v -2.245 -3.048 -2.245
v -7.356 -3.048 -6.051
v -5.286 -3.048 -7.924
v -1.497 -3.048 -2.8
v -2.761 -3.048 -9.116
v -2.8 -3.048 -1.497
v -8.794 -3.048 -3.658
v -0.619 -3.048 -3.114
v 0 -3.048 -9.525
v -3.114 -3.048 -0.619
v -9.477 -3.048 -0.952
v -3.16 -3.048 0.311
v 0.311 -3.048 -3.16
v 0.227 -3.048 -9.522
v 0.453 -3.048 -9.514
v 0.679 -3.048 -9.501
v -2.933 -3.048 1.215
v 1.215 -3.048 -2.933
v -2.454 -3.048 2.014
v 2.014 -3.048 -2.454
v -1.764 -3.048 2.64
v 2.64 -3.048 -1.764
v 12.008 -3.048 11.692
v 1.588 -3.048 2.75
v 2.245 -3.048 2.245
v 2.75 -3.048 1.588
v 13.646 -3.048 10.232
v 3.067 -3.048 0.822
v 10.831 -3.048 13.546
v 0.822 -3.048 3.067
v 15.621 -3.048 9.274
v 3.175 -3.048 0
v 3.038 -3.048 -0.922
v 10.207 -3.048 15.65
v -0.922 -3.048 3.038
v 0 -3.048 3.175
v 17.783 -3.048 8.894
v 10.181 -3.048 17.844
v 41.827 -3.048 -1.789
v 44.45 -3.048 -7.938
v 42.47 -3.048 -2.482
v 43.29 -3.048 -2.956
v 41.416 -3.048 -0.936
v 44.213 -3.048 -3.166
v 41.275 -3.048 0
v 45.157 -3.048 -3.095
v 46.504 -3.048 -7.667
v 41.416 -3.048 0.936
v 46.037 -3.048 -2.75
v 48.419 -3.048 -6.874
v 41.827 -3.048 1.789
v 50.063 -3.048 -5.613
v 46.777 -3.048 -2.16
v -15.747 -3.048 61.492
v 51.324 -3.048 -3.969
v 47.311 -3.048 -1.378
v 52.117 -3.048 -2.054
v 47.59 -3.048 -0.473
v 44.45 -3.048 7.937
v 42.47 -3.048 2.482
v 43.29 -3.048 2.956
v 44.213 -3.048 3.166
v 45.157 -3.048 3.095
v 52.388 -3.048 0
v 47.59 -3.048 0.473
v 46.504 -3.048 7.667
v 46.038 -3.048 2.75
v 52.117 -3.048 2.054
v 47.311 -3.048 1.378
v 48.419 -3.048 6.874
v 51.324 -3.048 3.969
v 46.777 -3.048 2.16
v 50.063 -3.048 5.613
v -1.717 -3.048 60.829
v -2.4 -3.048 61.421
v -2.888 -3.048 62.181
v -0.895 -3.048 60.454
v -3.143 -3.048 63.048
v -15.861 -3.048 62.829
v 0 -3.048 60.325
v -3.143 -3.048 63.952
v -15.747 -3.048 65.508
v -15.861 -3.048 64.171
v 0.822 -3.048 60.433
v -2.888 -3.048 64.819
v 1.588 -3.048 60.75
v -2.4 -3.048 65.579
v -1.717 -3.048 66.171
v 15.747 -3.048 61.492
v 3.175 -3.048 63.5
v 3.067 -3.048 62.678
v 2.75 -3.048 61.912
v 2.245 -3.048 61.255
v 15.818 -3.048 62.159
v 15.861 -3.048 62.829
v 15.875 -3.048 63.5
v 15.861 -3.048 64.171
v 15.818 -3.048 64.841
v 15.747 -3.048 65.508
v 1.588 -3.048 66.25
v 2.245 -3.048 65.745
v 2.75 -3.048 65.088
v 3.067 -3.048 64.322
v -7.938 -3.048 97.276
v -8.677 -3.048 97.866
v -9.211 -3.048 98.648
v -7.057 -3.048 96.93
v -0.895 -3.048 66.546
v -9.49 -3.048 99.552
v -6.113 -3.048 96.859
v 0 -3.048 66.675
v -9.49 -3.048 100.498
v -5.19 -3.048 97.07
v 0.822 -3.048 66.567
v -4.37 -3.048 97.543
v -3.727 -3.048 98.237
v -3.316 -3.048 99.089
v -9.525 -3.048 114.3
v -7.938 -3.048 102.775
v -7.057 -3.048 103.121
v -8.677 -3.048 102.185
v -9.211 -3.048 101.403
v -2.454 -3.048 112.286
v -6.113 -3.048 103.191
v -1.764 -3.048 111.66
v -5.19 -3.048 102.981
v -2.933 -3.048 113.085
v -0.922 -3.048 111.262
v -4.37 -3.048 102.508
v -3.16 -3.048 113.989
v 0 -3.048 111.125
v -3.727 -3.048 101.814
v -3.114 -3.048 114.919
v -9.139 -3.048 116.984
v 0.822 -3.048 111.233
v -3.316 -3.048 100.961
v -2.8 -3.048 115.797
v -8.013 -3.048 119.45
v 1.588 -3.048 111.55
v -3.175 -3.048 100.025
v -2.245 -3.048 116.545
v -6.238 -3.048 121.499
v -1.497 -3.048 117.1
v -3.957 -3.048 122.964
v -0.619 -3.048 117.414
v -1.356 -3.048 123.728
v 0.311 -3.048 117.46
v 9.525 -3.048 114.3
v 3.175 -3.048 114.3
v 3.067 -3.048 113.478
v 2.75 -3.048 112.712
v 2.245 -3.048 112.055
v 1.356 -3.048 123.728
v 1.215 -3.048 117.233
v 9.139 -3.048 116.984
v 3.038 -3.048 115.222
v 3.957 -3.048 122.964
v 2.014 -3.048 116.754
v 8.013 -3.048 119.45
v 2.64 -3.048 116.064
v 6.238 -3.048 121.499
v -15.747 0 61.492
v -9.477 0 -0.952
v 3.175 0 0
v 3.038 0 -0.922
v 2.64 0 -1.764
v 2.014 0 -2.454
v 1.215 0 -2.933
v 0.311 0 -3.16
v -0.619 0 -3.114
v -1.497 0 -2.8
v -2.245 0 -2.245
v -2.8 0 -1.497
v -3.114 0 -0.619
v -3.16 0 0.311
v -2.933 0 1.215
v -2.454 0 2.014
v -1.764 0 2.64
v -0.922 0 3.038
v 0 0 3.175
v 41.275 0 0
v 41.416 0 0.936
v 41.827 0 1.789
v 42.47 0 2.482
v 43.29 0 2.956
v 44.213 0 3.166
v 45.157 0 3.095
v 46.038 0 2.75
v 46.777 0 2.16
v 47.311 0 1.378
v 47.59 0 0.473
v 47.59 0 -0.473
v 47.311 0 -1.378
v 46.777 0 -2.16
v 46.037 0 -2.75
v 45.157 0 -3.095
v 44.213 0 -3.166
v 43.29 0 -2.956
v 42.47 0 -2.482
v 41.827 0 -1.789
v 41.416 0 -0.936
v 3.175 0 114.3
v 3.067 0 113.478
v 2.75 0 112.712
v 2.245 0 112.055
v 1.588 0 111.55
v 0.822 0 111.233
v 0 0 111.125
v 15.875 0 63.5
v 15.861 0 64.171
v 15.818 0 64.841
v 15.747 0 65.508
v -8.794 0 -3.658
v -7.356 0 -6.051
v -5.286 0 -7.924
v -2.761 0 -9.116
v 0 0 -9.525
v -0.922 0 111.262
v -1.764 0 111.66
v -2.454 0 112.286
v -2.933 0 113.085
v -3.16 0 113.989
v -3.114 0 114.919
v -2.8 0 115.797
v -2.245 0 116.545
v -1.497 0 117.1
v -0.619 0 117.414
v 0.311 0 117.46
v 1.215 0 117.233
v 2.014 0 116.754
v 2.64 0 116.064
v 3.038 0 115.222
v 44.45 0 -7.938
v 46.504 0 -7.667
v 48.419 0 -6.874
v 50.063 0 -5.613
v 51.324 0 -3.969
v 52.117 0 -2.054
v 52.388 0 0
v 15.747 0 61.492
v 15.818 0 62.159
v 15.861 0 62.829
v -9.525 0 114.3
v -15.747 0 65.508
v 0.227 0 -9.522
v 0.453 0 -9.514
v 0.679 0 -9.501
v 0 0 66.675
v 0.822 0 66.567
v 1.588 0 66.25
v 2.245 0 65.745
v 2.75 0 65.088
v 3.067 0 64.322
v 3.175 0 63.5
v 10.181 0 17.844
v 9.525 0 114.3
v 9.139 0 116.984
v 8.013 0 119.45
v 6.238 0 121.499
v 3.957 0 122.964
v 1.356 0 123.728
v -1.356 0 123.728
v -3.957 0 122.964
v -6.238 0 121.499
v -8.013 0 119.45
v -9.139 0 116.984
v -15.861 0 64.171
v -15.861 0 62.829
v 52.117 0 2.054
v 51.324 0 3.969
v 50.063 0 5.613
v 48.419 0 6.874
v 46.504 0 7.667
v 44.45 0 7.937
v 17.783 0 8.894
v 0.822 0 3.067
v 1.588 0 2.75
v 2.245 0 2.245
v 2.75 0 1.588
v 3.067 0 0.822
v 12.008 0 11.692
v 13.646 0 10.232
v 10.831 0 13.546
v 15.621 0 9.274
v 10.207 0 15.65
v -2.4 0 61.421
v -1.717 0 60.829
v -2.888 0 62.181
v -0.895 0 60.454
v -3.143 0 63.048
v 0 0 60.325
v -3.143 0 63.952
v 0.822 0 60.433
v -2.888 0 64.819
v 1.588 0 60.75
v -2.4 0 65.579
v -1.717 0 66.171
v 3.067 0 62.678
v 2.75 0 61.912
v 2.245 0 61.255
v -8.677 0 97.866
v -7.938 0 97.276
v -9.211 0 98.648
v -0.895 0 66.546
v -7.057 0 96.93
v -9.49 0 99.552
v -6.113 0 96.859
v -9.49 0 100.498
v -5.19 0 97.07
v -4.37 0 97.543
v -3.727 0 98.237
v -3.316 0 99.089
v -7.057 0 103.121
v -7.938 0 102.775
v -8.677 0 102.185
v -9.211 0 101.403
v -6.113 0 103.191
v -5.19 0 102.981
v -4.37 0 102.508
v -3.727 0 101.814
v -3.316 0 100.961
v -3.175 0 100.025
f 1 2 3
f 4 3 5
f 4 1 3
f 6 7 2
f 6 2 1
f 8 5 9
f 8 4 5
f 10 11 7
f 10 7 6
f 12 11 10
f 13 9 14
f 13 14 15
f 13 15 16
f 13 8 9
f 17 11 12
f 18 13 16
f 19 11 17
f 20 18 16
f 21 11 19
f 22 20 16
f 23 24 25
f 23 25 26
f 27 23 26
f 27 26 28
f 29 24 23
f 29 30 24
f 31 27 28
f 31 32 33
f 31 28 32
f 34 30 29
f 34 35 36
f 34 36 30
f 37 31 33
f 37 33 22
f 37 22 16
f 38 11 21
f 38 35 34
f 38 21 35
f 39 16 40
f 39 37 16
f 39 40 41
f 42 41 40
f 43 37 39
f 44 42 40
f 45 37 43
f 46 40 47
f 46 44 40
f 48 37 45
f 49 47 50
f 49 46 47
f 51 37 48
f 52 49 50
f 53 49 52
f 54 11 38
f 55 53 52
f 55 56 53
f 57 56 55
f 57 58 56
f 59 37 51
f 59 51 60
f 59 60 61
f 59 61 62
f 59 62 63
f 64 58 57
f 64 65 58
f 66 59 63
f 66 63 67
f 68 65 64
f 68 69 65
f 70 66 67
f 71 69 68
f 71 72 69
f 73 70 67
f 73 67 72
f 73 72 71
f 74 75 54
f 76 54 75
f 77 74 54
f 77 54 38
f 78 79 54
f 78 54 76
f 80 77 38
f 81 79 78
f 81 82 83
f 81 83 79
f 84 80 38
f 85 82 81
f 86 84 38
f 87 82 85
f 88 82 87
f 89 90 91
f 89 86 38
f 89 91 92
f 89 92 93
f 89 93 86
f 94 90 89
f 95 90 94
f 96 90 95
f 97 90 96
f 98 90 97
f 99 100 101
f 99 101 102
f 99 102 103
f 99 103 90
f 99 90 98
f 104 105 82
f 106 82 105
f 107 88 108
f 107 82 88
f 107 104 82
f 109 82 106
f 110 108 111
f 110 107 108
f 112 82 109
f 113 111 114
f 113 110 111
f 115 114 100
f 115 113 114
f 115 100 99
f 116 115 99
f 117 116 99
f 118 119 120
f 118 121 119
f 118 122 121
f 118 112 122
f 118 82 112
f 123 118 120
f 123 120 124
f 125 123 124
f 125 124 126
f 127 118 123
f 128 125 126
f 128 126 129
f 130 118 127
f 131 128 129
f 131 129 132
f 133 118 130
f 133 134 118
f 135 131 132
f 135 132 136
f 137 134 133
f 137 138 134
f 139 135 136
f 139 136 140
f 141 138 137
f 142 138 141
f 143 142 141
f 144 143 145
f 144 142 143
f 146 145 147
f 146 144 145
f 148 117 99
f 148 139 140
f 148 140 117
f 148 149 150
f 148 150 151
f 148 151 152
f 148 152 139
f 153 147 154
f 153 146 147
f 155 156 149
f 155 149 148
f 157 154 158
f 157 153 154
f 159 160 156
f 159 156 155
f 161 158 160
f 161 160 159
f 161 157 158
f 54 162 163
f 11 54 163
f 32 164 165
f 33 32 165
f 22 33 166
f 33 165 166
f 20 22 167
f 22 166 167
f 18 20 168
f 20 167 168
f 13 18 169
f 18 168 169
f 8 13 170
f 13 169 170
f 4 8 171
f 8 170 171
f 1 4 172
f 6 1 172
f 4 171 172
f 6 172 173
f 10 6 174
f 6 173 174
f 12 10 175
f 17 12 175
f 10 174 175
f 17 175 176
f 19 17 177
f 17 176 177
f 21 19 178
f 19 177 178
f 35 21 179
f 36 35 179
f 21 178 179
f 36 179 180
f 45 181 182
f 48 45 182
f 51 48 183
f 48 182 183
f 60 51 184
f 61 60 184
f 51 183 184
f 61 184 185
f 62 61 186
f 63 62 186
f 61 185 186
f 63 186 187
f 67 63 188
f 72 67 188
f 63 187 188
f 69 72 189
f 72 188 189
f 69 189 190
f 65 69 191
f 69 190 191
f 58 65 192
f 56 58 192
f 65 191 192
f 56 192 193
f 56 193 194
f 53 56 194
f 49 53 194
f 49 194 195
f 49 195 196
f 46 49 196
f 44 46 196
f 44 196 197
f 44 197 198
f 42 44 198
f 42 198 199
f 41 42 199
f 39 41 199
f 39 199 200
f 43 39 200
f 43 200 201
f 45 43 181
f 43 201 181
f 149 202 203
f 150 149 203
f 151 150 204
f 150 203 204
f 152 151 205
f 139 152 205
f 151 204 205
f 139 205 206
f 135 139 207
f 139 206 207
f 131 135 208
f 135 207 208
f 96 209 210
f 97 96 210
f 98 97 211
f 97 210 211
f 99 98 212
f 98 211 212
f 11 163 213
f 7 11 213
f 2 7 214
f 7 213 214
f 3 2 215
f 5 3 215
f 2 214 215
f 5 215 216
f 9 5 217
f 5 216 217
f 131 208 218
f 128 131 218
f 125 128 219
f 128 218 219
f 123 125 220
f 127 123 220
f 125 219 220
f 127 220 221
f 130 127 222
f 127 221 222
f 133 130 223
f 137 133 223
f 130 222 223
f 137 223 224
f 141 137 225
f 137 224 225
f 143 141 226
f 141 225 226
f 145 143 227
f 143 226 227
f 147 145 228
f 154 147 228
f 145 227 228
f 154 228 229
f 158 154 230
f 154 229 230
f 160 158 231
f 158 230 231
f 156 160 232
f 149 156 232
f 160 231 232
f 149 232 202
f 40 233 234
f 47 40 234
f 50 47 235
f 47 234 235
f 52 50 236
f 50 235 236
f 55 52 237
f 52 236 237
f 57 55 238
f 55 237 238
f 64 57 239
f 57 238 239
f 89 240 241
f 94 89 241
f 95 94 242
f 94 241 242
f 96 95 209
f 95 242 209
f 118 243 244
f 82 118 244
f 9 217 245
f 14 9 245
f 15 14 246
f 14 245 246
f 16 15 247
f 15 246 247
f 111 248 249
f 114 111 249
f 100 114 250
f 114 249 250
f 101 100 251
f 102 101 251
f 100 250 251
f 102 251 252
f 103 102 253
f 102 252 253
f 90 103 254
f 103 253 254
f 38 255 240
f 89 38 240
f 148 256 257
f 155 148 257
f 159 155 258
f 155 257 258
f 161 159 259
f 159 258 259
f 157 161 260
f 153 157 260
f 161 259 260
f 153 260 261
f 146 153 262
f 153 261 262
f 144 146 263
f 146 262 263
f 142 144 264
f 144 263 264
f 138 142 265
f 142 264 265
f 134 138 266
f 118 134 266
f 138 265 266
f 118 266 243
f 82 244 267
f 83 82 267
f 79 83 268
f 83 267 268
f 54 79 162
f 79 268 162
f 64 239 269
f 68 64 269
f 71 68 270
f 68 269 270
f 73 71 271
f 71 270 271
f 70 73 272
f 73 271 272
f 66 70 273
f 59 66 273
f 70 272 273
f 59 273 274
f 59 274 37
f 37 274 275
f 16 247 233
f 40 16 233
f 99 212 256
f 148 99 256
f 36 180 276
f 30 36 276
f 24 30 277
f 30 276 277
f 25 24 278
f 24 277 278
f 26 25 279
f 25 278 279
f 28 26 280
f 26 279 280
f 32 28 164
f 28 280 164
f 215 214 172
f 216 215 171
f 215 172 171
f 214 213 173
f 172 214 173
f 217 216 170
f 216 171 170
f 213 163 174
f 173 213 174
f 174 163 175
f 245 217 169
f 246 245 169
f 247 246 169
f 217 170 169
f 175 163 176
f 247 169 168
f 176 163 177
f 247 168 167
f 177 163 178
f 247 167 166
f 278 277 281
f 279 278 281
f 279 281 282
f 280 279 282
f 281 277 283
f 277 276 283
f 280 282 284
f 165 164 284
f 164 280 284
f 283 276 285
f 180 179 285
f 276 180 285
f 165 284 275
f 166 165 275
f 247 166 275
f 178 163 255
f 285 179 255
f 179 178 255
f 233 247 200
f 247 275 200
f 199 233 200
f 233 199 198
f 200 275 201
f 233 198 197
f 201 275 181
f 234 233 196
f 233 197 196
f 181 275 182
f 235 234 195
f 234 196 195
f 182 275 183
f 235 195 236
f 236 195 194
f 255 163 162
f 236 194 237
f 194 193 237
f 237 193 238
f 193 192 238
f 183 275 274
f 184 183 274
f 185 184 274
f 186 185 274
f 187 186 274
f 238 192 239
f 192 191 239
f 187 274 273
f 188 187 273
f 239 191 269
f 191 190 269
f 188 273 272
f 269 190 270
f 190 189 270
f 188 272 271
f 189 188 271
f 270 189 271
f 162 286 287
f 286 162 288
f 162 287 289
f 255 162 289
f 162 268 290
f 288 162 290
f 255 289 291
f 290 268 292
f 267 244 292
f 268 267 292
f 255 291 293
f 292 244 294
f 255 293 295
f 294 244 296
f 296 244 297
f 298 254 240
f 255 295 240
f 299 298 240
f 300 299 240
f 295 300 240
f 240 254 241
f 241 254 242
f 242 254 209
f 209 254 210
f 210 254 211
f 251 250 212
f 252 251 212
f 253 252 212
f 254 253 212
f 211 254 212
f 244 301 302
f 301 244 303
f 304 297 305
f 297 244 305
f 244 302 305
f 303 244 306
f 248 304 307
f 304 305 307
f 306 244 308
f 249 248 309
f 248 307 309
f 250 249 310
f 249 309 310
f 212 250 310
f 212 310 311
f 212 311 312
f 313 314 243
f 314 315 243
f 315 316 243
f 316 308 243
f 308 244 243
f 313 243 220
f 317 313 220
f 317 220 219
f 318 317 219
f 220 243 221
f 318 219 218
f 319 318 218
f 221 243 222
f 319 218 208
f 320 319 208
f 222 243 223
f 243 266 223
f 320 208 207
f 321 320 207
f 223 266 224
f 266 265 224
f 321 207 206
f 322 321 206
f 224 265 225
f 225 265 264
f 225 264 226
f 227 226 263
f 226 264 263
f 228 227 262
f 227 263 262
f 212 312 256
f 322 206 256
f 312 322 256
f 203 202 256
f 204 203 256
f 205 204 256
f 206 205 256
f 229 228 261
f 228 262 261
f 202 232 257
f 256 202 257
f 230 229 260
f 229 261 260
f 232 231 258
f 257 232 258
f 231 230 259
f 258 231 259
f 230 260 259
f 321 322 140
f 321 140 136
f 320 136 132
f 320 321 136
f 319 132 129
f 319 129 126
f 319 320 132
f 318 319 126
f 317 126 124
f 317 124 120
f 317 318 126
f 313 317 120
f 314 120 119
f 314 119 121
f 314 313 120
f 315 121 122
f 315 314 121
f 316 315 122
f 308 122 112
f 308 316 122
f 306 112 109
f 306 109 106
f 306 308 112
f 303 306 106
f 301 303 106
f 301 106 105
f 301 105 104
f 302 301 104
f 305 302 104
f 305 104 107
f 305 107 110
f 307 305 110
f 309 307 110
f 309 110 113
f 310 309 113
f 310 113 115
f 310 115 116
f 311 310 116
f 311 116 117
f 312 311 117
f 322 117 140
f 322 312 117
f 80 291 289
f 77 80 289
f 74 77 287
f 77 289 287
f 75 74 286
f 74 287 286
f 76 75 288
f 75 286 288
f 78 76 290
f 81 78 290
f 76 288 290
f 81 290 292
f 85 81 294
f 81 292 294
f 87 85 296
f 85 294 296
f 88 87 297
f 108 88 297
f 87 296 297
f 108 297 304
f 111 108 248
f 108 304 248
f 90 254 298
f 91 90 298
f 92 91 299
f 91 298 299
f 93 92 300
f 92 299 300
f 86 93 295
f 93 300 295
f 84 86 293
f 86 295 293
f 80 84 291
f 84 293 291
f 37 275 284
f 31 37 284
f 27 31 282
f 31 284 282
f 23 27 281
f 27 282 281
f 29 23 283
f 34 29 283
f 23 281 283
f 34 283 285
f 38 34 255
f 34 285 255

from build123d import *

# Parameters (mm, degrees)
F0_R     = 3.175
F1_DEPTH = 3.048


with BuildPart() as f1:
    # F0 (on Front) → F1 (new body)
    with BuildSketch(Plane.XZ):
        with BuildLine():
            Line((0.6794904459, -9.5007324841), (0, -9.525))
            ThreePointArc((0, -9.525), (0.3399618281, -9.5189311877), (0.6794904459, -9.5007324841))
        make_face()
        with BuildLine():
            Line((-15.7474569047, 61.4917106696), (-9.4773410414, -0.9516468803))
            ThreePointArc((-9.4773410414, -0.9516468803), (-7.0636414665, 6.3898821767), (0, 9.525))
            Line((0, 9.525), (0, 47.625))
            ThreePointArc((0, 47.625), (-10.4912828548, 51.5857812233), (-15.7474569047, 61.4917106696))
        make_face()
        with BuildLine():
            ThreePointArc((9.525, 0), (6.9712901065, -6.4905114784), (0.6794904459, -9.5007324841))
            Line((0.6794904459, -9.5007324841), (44.45, -7.9375))
            ThreePointArc((44.45, -7.9375), (38.8373399243, -5.6126600757), (36.5125, 0))
            Line((36.5125, 0), (9.525, 0))
        make_face()
        with BuildLine():
            Line((0, 104.775), (0, 79.375))
            ThreePointArc((0, 79.375), (10.4912828548, 75.4142187767), (15.7474569047, 65.5082893304))
            Line((15.7474569047, 65.5082893304), (9.525, 114.3))
            ThreePointArc((9.525, 114.3), (6.7351920908, 107.5648079092), (0, 104.775))
        make_face()
        with BuildLine():
            ThreePointArc((9.525, 114.3), (0, 123.825), (-9.525, 114.3))
            ThreePointArc((-9.525, 114.3), (-6.7351920908, 107.5648079092), (0, 104.775))
            ThreePointArc((0, 104.775), (6.7351920908, 107.5648079092), (9.525, 114.3))
        make_face()
        with BuildLine():
            ThreePointArc((3.175, 114.3), (2.2450640303, 112.0549359697), (0, 111.125))
            ThreePointArc((0, 111.125), (-2.2450640303, 116.5450640303), (3.175, 114.3))
        make_face(mode=Mode.SUBTRACT)
        with BuildLine():
            ThreePointArc((36.5125, 0), (38.8373399243, -5.6126600757), (44.45, -7.9375))
            ThreePointArc((44.45, -7.9375), (50.0626600757, -5.6126600757), (52.3875, 0))
            ThreePointArc((52.3875, 0), (50.0626600757, 5.6126600757), (44.45, 7.9375))
            ThreePointArc((44.45, 7.9375), (38.8373399243, 5.6126600757), (36.5125, 0))
        make_face()
        with BuildLine():
            ThreePointArc((47.625, 0), (44.45, -3.175), (41.275, 0))
            ThreePointArc((41.275, 0), (44.45, 3.175), (47.625, 0))
        make_face(mode=Mode.SUBTRACT)
        with BuildLine():
            Line((0, 60.325), (0, 47.625))
            ThreePointArc((0, 47.625), (10.4912828548, 51.5857812233), (15.7474569047, 61.4917106696))
            ThreePointArc((15.7474569047, 61.4917106696), (15.8430821396, 62.4938323604), (15.875, 63.5))
            ThreePointArc((15.875, 63.5), (15.8430821396, 64.5061676396), (15.7474569047, 65.5082893304))
            ThreePointArc((15.7474569047, 65.5082893304), (10.4912828548, 75.4142187767), (0, 79.375))
            Line((0, 79.375), (0, 66.675))
            ThreePointArc((0, 66.675), (2.2450640303, 65.7450640303), (3.175, 63.5))
            ThreePointArc((3.175, 63.5), (2.2450640303, 61.2549359697), (0, 60.325))
        make_face()
        with BuildLine():
            ThreePointArc((-15.7474569047, 65.5082893304), (-15.875, 63.5), (-15.7474569047, 61.4917106696))
            ThreePointArc((-15.7474569047, 61.4917106696), (-10.4912828548, 51.5857812233), (0, 47.625))
            Line((0, 47.625), (0, 60.325))
            ThreePointArc((0, 60.325), (-3.175, 63.5), (0, 66.675))
            Line((0, 66.675), (0, 79.375))
            ThreePointArc((0, 79.375), (-10.4912828548, 75.4142187767), (-15.7474569047, 65.5082893304))
        make_face()
        with BuildLine():
            Line((-9.525, 114.3), (-15.7474569047, 65.5082893304))
            ThreePointArc((-15.7474569047, 65.5082893304), (-10.4912828548, 75.4142187767), (0, 79.375))
            Line((0, 79.375), (0, 104.775))
            ThreePointArc((0, 104.775), (-6.7351920908, 107.5648079092), (-9.525, 114.3))
        make_face()
        with Locations((-6.35, 100.0252)):
            Circle(F0_R, mode=Mode.SUBTRACT)
        with BuildLine():
            Line((0, 47.625), (0, 9.525))
            ThreePointArc((0, 9.525), (6.7351920908, 6.7351920908), (9.525, 0))
            Line((9.525, 0), (36.5125, 0))
            ThreePointArc((36.5125, 0), (38.8373399243, 5.6126600757), (44.45, 7.9375))
            Line((44.45, 7.9375), (17.7825532299, 8.8935802069))
            ThreePointArc((17.7825532299, 8.8935802069), (12.0075791655, 11.6923910174), (10.1810740488, 17.8444269776))
            Line((10.1810740488, 17.8444269776), (15.7474569047, 61.4917106696))
            ThreePointArc((15.7474569047, 61.4917106696), (10.4912828548, 51.5857812233), (0, 47.625))
        make_face()
        with BuildLine():
            ThreePointArc((0, 9.525), (-7.0636414665, 6.3898821767), (-9.4773410414, -0.9516468803))
            ThreePointArc((-9.4773410414, -0.9516468803), (-6.3898821767, -7.0636414665), (0, -9.525))
            Line((0, -9.525), (0.6794904459, -9.5007324841))
            ThreePointArc((0.6794904459, -9.5007324841), (6.9712901065, -6.4905114784), (9.525, 0))
            Line((9.525, 0), (3.175, 0))
            ThreePointArc((3.175, 0), (-2.2450640303, -2.2450640303), (0, 3.175))
            Line((0, 3.175), (0, 9.525))
        make_face()
        with BuildLine():
            ThreePointArc((9.525, 0), (6.7351920908, 6.7351920908), (0, 9.525))
            Line((0, 9.525), (0, 3.175))
            ThreePointArc((0, 3.175), (2.2450640303, 2.2450640303), (3.175, 0))
            Line((3.175, 0), (9.525, 0))
        make_face()
    extrude(amount=F1_DEPTH)


solid = f1.part
